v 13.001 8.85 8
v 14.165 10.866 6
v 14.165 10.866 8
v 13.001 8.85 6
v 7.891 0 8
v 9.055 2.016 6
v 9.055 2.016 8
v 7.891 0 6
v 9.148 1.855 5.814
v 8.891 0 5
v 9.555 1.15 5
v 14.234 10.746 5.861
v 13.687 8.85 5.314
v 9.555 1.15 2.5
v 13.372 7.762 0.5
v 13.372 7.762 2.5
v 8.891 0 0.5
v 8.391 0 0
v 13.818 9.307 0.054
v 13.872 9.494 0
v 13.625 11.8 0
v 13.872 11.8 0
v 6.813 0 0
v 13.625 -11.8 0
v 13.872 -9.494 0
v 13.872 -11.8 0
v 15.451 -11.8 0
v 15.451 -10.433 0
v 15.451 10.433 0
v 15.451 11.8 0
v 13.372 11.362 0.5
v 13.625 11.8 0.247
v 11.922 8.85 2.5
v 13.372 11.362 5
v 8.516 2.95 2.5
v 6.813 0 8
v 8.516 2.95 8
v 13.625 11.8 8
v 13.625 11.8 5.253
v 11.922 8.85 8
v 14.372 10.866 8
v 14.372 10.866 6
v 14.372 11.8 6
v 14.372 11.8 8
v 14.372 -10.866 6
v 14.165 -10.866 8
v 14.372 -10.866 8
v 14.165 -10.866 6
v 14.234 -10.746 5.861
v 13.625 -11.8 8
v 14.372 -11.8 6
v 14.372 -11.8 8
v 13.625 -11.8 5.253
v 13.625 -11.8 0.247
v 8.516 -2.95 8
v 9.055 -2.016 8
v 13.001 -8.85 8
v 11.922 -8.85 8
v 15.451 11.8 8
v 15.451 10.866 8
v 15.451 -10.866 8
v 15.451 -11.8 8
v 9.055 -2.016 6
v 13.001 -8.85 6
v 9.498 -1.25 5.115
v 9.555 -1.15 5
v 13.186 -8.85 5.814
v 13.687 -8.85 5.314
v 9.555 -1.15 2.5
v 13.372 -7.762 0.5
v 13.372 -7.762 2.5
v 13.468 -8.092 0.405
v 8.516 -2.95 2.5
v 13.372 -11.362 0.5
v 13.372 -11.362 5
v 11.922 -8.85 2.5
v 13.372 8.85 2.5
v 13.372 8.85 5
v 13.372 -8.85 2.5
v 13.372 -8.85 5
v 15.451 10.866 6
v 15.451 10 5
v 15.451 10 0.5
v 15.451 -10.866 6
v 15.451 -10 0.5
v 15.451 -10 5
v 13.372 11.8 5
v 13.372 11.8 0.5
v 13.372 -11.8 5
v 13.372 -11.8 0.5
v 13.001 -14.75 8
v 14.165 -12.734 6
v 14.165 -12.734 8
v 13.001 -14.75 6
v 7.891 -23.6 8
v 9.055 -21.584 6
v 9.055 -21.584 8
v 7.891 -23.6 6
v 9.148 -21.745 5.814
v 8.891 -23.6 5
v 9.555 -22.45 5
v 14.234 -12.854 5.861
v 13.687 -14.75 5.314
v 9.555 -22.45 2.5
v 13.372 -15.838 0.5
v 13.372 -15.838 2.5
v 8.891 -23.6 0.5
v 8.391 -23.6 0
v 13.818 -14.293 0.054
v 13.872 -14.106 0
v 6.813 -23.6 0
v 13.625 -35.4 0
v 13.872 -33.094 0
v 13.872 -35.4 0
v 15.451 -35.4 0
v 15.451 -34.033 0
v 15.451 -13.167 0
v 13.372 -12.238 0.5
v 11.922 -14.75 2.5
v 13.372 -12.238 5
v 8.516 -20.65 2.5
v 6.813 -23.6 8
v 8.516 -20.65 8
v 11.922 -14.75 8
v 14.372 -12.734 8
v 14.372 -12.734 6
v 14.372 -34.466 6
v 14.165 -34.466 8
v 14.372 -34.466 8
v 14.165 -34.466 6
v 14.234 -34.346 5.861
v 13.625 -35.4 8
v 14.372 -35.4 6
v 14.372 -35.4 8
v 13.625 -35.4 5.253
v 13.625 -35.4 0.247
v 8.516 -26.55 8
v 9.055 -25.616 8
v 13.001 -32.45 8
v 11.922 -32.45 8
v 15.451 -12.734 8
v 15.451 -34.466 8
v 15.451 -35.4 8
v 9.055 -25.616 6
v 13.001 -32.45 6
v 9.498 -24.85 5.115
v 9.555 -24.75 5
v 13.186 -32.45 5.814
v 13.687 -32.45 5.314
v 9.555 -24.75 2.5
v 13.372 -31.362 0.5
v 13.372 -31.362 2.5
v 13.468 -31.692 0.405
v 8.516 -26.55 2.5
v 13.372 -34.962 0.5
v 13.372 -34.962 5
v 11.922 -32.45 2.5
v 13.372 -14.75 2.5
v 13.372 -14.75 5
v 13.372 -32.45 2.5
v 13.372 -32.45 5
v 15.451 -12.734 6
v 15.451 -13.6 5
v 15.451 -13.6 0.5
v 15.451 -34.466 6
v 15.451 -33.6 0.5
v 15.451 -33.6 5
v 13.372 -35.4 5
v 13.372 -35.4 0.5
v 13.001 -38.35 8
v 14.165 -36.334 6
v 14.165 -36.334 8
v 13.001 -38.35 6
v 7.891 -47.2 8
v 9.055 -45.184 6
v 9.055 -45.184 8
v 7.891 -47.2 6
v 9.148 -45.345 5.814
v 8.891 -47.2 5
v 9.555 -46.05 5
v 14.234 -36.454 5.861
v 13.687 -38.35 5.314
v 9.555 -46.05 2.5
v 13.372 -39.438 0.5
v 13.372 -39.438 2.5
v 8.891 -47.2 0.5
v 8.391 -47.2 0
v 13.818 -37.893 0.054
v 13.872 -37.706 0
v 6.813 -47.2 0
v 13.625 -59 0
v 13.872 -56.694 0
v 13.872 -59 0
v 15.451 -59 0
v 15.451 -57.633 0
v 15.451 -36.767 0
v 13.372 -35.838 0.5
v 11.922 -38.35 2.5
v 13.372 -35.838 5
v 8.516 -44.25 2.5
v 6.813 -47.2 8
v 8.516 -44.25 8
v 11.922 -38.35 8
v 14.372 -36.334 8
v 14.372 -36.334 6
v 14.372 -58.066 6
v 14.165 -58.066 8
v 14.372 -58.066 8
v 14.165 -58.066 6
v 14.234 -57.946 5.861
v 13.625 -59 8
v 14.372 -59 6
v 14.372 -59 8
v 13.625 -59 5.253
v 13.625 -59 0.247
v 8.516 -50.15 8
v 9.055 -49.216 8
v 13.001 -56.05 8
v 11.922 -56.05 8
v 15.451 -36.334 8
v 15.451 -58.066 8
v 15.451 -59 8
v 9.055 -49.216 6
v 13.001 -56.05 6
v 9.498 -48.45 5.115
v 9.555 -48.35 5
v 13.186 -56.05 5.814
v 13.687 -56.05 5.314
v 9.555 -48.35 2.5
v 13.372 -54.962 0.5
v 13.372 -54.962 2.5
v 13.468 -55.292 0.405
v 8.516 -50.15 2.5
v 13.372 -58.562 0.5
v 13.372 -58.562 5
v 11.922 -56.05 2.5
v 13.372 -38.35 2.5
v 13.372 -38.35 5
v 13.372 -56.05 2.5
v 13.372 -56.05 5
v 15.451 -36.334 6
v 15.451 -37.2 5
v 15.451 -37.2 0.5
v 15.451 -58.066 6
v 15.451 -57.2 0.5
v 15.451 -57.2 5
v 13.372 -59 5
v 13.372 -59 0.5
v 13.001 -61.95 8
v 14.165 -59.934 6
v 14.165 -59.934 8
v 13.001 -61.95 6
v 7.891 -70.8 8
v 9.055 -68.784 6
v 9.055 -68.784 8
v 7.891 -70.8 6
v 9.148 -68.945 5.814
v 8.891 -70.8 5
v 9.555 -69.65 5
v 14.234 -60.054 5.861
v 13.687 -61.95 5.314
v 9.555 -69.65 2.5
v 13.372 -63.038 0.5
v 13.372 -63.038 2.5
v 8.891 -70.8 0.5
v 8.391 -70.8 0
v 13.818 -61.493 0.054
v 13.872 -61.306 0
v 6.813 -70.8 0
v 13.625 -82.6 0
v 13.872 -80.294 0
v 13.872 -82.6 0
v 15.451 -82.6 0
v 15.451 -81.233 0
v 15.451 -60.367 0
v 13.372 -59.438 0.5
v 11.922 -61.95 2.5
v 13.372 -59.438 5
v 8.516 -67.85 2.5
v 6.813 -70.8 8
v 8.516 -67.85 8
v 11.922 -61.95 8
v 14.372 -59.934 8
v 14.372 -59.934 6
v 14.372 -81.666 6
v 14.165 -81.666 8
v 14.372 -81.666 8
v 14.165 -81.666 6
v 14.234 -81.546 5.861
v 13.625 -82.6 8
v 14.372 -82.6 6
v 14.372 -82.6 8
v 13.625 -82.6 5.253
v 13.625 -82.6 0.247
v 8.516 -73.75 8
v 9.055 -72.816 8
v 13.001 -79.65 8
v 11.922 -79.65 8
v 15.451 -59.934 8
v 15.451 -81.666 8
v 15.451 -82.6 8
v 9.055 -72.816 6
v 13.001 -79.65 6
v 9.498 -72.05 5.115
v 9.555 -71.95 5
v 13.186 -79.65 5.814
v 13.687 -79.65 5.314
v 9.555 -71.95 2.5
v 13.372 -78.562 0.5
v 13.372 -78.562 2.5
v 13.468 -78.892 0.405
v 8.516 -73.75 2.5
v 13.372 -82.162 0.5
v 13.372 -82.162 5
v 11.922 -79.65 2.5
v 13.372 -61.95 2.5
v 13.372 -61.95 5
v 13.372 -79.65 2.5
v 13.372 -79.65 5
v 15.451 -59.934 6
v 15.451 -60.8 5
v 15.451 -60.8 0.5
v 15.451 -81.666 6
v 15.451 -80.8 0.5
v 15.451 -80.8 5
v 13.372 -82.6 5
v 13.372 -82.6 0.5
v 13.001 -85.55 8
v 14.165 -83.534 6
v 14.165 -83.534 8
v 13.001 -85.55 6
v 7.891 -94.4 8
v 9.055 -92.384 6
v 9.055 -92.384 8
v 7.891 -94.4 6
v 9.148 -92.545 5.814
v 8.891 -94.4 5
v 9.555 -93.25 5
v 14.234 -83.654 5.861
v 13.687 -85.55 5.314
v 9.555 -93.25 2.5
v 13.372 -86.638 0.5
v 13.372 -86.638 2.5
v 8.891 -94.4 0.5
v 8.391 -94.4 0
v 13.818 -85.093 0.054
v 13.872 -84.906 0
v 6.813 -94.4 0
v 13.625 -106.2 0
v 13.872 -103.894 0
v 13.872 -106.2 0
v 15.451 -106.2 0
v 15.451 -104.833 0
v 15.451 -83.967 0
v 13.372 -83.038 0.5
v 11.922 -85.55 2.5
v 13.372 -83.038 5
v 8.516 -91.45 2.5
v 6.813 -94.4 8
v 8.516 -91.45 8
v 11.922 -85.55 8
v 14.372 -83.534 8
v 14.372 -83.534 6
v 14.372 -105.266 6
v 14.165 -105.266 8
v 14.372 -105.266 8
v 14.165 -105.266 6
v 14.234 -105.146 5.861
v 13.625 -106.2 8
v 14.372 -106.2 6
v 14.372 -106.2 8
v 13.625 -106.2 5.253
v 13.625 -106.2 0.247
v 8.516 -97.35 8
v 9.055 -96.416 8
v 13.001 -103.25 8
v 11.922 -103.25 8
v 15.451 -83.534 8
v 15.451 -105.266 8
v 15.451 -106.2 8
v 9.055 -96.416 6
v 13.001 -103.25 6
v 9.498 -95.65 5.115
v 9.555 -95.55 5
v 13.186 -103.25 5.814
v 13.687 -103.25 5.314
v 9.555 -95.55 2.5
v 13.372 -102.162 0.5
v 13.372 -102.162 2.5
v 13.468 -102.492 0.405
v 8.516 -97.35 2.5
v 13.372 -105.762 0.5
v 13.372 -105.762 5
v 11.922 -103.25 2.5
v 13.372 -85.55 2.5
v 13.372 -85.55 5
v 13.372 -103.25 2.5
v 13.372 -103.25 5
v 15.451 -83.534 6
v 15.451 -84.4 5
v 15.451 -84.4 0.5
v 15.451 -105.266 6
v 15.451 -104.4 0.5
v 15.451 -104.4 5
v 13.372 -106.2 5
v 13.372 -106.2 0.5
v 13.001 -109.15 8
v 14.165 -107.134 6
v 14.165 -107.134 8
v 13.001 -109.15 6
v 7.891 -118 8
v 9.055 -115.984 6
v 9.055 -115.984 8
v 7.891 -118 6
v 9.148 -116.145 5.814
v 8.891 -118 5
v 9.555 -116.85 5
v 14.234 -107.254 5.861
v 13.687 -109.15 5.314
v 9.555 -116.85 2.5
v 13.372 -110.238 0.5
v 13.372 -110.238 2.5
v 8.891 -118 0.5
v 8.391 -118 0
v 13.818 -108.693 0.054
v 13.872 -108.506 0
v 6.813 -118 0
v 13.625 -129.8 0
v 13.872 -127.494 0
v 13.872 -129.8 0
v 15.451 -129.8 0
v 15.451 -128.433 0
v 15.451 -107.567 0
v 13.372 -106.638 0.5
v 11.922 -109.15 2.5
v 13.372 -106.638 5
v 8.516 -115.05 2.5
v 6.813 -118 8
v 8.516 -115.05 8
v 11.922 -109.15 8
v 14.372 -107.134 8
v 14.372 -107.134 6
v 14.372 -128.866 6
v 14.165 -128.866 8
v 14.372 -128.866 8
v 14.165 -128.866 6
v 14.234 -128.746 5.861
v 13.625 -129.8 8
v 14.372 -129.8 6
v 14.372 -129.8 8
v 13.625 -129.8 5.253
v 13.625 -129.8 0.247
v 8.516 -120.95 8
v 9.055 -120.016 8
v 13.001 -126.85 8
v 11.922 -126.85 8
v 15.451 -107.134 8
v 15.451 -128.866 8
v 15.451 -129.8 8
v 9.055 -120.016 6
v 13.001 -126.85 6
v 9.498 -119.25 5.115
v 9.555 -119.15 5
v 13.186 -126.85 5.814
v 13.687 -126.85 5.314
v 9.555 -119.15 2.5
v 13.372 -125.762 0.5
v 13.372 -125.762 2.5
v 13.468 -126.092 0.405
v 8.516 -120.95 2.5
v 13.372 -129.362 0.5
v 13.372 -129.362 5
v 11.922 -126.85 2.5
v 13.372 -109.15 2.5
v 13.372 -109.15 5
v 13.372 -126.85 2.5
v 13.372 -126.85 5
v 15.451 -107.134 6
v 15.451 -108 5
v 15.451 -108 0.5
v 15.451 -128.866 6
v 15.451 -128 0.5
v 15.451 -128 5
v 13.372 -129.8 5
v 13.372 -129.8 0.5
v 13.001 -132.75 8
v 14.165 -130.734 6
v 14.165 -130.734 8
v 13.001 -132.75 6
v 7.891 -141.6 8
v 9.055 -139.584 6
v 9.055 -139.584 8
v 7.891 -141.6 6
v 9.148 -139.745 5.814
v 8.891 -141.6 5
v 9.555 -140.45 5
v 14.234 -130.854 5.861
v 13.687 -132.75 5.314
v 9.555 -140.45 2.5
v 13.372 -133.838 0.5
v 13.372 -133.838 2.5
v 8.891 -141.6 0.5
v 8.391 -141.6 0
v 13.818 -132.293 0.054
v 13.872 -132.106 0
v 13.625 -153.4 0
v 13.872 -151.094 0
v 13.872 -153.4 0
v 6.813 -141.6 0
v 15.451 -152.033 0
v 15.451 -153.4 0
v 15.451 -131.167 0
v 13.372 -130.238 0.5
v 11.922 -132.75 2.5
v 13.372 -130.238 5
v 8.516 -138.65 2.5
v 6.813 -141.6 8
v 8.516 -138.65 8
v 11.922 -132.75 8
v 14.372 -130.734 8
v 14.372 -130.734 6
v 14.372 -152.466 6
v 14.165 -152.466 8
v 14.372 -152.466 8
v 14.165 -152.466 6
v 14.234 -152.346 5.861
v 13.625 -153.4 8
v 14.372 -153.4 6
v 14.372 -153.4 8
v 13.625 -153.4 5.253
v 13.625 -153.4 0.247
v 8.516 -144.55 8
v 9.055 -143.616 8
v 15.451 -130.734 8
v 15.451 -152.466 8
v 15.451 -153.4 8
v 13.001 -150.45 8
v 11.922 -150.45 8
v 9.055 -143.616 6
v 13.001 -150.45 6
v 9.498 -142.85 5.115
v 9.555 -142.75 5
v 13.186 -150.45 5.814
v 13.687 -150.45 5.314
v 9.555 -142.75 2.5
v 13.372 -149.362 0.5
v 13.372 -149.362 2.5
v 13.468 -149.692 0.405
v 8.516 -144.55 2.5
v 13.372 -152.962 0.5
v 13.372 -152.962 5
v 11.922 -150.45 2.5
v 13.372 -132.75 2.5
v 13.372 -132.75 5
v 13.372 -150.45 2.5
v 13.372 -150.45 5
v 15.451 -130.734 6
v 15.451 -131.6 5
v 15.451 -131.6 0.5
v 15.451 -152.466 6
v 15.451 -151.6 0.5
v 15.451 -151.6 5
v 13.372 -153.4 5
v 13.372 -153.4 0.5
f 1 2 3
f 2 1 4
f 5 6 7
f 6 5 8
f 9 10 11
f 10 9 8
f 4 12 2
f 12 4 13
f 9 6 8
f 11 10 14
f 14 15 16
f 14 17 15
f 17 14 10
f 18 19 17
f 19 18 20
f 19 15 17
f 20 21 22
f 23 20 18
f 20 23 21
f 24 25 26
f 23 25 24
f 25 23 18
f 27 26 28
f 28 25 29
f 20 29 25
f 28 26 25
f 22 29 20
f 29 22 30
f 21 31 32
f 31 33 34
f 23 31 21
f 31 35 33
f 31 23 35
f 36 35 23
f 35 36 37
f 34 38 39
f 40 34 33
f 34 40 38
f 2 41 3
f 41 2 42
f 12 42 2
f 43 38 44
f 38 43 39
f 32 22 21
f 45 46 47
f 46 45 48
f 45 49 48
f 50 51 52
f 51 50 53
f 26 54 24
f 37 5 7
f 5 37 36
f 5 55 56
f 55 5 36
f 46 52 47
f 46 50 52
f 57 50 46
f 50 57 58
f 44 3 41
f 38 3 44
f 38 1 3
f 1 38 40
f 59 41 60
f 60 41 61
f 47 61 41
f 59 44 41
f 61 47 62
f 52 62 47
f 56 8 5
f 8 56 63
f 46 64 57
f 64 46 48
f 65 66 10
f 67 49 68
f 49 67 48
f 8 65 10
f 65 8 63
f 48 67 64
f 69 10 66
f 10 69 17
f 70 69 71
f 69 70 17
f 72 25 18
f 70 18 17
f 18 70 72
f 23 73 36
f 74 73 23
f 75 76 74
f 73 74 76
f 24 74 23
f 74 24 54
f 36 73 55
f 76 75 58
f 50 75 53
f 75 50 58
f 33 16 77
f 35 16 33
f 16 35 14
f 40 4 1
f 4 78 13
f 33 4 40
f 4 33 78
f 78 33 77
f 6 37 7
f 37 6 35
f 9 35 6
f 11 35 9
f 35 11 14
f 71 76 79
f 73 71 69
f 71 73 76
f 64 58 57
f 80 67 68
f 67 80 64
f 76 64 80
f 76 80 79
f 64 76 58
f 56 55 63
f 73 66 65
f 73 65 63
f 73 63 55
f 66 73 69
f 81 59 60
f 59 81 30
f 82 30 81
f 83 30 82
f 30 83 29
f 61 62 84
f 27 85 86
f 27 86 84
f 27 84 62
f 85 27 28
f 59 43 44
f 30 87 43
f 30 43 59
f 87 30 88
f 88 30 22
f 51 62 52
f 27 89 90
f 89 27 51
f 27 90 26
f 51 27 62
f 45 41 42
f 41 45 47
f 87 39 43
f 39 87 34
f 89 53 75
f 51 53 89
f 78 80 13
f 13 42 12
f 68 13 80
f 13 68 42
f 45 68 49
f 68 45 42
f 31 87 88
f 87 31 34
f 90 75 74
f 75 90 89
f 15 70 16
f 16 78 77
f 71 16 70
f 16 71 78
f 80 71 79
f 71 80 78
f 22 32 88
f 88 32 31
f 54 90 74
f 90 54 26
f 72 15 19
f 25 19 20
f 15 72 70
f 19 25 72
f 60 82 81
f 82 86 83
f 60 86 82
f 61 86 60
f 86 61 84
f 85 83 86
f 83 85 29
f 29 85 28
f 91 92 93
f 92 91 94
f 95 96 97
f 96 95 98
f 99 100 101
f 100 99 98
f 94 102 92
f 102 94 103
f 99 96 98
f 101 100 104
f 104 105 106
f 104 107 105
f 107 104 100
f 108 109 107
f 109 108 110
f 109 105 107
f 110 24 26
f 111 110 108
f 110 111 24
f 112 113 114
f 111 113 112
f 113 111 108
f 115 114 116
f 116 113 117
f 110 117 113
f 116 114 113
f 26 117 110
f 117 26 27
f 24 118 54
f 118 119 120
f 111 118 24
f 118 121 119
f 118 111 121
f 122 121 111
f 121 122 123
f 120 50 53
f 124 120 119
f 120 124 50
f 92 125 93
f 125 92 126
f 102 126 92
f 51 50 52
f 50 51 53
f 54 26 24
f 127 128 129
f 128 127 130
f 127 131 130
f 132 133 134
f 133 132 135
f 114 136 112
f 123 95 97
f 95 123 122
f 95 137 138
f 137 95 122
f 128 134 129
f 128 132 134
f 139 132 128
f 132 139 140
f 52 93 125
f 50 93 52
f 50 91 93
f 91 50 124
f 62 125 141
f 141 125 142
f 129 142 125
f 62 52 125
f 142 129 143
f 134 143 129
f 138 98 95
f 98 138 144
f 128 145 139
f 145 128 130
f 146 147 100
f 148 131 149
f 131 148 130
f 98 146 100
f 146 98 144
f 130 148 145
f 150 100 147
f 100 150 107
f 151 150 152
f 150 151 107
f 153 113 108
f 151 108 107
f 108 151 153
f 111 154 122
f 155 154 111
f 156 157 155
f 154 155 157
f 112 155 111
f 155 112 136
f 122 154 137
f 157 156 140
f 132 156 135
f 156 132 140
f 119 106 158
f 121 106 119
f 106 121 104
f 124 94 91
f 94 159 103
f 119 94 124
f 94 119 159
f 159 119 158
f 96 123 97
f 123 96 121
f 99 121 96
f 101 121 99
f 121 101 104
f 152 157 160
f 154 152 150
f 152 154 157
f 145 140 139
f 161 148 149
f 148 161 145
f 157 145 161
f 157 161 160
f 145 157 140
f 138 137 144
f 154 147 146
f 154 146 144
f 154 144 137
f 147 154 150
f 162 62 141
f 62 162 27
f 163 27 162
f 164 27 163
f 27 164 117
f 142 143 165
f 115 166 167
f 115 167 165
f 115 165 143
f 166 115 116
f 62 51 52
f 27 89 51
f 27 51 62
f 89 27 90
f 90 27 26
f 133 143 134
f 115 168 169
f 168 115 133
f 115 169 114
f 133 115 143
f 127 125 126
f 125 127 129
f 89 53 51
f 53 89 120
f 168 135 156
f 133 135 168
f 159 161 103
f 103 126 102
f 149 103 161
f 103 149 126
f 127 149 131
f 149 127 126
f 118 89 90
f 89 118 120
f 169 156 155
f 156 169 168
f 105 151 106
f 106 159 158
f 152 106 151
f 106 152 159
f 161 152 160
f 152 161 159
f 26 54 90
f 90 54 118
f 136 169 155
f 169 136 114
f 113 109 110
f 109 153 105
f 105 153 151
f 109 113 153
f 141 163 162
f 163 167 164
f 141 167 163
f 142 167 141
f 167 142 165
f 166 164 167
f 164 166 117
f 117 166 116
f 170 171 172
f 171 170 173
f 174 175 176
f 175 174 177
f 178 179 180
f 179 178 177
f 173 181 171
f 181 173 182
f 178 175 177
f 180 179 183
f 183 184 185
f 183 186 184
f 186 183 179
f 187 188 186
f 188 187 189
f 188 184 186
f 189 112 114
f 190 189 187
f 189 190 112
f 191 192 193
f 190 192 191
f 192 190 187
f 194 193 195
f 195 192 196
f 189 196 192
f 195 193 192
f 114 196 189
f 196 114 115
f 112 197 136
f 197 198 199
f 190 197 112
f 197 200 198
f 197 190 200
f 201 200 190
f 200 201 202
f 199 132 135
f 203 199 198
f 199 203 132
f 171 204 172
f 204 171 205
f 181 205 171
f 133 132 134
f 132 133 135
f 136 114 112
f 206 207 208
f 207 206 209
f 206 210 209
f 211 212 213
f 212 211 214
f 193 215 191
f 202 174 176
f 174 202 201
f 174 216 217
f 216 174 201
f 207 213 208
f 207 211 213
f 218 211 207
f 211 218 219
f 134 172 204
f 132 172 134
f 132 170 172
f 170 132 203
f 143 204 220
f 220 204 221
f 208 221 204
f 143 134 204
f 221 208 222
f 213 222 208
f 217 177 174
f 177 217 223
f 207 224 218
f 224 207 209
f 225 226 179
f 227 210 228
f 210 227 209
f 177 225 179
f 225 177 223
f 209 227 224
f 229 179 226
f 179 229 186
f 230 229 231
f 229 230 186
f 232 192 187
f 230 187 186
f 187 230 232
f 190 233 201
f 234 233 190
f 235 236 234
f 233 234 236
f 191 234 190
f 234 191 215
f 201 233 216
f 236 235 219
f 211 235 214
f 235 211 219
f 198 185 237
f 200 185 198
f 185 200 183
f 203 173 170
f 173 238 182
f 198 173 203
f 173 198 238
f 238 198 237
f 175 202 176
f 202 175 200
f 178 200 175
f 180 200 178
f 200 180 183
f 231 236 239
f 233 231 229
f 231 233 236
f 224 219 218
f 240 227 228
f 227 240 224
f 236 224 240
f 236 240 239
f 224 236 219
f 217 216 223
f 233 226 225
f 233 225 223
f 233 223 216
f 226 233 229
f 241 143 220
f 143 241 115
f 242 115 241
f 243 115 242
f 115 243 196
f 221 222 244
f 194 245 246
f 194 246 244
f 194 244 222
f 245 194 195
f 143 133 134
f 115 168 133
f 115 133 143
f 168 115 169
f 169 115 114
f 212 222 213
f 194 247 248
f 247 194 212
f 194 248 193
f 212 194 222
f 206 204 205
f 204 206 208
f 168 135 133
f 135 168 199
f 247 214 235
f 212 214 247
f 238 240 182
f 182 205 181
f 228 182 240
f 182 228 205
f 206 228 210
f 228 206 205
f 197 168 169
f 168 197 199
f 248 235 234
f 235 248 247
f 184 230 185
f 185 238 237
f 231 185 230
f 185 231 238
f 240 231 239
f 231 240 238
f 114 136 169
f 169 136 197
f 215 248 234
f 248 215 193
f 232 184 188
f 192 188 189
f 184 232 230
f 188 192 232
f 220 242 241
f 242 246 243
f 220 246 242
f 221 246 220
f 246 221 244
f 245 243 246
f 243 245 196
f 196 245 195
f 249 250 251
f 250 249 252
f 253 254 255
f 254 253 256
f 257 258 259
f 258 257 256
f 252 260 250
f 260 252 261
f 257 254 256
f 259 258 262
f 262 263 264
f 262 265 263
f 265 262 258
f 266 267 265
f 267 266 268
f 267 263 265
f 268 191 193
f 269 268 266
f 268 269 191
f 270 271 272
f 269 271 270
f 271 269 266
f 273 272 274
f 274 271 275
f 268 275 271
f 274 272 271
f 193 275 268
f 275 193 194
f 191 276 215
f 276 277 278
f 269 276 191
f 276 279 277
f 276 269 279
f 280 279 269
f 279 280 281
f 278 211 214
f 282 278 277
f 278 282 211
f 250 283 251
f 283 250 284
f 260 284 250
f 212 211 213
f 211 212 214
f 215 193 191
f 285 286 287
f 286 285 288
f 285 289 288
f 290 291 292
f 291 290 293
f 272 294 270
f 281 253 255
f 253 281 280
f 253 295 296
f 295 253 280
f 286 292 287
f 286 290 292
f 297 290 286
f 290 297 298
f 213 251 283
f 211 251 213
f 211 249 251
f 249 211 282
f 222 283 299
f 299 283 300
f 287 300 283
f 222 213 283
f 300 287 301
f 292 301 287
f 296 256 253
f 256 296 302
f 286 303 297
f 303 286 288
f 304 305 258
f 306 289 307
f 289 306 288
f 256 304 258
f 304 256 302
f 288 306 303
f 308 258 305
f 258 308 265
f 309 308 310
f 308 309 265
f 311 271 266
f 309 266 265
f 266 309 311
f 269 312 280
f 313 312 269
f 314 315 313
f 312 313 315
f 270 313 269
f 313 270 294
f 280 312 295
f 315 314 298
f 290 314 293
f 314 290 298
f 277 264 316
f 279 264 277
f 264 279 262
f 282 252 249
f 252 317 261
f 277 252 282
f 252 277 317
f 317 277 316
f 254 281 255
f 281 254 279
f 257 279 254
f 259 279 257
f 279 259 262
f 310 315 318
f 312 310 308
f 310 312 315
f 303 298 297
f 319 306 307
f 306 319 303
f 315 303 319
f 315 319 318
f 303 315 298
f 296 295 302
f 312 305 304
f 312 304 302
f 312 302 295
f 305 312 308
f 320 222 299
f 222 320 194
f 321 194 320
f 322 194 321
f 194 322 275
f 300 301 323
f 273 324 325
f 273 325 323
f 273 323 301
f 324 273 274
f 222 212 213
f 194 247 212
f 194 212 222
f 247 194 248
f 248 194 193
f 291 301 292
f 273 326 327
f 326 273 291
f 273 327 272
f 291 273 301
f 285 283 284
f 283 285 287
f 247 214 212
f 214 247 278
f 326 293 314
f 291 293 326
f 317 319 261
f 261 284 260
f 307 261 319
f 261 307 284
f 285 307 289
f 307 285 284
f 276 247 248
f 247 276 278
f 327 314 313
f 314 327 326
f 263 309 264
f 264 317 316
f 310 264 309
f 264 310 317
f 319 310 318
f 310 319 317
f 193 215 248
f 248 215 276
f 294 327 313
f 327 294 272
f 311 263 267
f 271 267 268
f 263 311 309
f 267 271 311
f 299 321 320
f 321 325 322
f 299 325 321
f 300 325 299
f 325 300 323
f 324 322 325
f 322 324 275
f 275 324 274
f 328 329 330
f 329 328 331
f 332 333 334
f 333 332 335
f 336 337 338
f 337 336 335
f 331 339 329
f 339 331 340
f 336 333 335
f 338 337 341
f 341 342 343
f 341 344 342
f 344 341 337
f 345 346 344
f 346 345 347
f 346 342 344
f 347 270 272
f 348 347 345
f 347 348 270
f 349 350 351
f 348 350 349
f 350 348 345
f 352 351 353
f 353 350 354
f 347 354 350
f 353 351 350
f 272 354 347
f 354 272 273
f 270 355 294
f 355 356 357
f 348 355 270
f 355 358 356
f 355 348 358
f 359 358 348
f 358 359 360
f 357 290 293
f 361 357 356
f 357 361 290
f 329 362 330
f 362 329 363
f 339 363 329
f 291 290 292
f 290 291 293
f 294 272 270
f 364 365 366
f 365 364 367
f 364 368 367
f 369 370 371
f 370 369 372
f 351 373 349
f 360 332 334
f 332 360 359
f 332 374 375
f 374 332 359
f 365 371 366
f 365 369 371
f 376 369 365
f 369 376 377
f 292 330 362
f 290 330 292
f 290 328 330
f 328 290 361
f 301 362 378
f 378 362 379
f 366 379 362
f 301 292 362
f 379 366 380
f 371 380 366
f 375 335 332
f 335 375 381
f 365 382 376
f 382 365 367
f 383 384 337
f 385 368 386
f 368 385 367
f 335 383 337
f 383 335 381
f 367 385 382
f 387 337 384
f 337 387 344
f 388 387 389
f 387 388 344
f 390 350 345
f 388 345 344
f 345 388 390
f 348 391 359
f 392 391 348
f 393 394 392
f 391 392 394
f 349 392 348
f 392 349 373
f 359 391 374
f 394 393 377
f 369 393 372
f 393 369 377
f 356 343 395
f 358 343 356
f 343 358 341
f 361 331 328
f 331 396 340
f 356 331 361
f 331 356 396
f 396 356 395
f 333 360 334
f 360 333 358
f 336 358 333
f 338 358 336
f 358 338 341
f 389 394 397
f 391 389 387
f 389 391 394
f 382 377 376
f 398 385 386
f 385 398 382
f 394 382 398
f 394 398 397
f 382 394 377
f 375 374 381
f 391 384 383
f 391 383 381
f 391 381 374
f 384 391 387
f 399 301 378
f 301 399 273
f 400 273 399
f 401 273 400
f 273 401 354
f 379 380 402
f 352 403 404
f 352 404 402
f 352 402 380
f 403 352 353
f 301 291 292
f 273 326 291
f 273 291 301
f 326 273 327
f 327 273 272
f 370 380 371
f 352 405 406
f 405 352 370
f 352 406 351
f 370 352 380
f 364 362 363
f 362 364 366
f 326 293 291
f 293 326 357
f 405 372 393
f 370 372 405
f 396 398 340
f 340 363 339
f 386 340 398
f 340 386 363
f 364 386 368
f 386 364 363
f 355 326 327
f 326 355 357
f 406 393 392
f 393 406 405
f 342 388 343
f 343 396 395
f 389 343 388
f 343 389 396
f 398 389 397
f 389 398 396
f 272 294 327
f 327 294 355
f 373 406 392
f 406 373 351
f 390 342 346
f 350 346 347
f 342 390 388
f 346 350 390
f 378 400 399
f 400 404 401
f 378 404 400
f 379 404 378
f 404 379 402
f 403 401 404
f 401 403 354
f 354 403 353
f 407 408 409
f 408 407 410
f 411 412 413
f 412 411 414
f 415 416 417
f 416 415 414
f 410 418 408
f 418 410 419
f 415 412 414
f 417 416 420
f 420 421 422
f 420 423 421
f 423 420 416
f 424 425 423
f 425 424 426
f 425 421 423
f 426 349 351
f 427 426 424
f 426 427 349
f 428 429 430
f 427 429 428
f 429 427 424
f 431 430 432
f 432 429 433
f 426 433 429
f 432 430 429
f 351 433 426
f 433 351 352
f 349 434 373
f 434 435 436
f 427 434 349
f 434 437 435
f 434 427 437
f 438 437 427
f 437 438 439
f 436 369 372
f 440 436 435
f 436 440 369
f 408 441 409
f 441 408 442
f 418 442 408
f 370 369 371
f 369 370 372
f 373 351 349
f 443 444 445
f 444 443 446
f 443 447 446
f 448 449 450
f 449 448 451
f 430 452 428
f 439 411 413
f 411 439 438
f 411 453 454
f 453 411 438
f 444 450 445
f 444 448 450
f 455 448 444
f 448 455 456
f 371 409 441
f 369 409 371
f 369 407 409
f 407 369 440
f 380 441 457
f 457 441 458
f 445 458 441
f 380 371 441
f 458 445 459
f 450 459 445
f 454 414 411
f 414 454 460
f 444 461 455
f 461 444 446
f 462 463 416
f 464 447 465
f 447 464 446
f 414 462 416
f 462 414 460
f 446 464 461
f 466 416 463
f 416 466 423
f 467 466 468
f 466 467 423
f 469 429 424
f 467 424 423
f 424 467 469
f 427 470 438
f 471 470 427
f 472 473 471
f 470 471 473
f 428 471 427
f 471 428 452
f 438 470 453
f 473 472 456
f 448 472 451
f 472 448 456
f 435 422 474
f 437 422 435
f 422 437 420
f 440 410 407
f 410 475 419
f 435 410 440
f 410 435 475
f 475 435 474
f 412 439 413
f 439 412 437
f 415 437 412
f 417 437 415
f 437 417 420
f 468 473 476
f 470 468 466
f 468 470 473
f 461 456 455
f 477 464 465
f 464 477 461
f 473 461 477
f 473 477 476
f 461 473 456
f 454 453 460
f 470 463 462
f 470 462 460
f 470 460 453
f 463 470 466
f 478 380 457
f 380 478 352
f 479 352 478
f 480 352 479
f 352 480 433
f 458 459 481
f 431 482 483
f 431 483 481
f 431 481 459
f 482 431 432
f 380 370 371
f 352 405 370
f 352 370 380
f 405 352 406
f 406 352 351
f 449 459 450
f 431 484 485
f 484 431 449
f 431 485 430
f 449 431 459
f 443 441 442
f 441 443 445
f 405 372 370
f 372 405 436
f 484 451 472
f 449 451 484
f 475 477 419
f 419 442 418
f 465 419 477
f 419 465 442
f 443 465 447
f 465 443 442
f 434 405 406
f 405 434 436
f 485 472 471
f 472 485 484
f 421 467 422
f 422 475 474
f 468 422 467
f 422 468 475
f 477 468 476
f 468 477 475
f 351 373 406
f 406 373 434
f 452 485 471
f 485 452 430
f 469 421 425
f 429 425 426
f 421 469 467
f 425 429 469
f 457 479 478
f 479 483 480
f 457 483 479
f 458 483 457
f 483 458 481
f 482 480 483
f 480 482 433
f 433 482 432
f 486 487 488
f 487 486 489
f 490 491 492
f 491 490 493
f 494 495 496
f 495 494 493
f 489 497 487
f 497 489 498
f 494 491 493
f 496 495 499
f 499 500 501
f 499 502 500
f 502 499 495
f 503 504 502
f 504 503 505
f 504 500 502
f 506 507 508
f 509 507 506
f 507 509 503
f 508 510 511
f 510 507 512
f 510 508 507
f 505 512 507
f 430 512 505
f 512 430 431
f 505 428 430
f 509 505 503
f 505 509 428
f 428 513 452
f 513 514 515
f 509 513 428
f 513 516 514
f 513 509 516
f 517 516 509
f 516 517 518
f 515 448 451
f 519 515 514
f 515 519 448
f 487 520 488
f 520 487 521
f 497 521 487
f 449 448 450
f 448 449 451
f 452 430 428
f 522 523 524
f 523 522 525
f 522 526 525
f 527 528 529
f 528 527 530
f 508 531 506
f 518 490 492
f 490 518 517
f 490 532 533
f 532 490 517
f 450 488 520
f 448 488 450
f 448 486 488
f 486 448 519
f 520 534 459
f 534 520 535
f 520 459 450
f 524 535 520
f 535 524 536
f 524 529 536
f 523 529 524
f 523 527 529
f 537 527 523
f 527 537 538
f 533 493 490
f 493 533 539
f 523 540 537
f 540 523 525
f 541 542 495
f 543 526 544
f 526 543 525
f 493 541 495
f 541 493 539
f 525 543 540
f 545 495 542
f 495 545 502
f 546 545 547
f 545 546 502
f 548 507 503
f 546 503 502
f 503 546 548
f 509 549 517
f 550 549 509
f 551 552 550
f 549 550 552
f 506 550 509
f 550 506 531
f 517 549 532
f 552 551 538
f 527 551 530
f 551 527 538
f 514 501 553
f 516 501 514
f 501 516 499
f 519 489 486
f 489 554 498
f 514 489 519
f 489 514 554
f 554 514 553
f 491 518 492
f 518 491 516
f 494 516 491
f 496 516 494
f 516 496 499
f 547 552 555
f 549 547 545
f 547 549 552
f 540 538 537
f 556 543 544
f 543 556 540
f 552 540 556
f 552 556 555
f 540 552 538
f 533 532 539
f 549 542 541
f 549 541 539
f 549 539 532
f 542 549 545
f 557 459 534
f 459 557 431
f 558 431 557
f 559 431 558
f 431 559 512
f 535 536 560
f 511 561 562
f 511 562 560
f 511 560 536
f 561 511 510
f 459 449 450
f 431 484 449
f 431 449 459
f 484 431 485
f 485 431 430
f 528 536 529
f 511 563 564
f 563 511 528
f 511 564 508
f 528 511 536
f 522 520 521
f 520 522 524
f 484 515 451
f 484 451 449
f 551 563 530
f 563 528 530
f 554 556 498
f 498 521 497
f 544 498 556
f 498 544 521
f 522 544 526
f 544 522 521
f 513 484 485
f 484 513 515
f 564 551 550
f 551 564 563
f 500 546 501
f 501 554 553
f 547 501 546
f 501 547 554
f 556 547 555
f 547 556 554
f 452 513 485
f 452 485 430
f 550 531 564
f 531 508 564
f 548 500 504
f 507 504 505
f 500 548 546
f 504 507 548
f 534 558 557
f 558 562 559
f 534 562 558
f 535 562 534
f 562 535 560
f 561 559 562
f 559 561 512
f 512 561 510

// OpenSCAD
$fn = 50;

radius = 13.6;
diameter =  radius * 2;

h_inner = 10;
r_inner = h_inner * 2/sqrt(3);

h_outer = 10+1.8;
r_outer = h_outer * 2/sqrt(3);


h_thin = 10+1;
r_thin = h_thin * 2/sqrt(3);

total_height = 8;

small_value = 0.1;


clips_height = 5;
clips_offset = 0.5;
clips_side_offset = 0.00;


module basic_polygon() {
  polygon([[r_outer, total_height], [r_outer, 0], [r_inner+0.5, 0], [r_inner, 0.5], 
        [r_inner, total_height-3], [r_inner+1, total_height-2], [r_inner+1,total_height]]);    
}

module basic_model() {
  rotate_extrude($fn=6) {
      basic_polygon();
  }
}


module panel_with_clips(pin_1=false, pin_2=false, pin_3=false, pin_4=false, pin_5=false, pin_6=false, slot_1=false, slot_2=false, slot_3=false, slot_4=false, slot_5=false, slot_6=false) {

  difference() {
    basic_model();

    if (slot_1) {
      rotate([0, 0, 0])
        translate([0, -h_outer*2, total_height - (clips_height+clips_offset)/2])
          linear_extrude(height=clips_height+clips_offset, center=true)
            polygon([[clips_side_offset, h_outer/2], [-clips_side_offset, h_outer/2], [-r_outer/2-clips_side_offset, h_outer*1.5], [r_outer/2+clips_side_offset, h_outer*1.5]]);
    }

    if (slot_2) {
      rotate([0, 0, 60])
        translate([0, -h_outer*2, total_height - (clips_height+clips_offset)/2])
          linear_extrude(height=clips_height+clips_offset, center=true)
            polygon([[clips_side_offset, h_outer/2], [-clips_side_offset, h_outer/2], [-r_outer/2-clips_side_offset, h_outer*1.5], [r_outer/2+clips_side_offset, h_outer*1.5]]);
    }



    if (slot_3) {
      rotate([0, 0, 120])
        translate([0, -h_outer*2, total_height - (clips_height+clips_offset)/2])
          linear_extrude(height=clips_height+clips_offset, center=true)
            polygon([[clips_side_offset, h_outer/2], [-clips_side_offset, h_outer/2], [-r_outer/2-clips_side_offset, h_outer*1.5], [r_outer/2+clips_side_offset, h_outer*1.5]]);
    }

    if (slot_4) {
      rotate([0, 0, 180])
        translate([0, -h_outer*2, total_height - (clips_height+clips_offset)/2])
          linear_extrude(height=clips_height+clips_offset, center=true)
            polygon([[clips_side_offset, h_outer/2], [-clips_side_offset, h_outer/2], [-r_outer/2-clips_side_offset, h_outer*1.5], [r_outer/2+clips_side_offset, h_outer*1.5]]);
    }

    if (slot_5) {
      rotate([0, 0, 240])
        translate([0, -h_outer*2, total_height - (clips_height+clips_offset)/2])
          linear_extrude(height=clips_height+clips_offset, center=true)
            polygon([[clips_side_offset, h_outer/2], [-clips_side_offset, h_outer/2], [-r_outer/2-clips_side_offset, h_outer*1.5], [r_outer/2+clips_side_offset, h_outer*1.5]]);
    }

    if (slot_6) {
      rotate([0, 0, 300])
        translate([0, -h_outer*2, total_height - (clips_height+clips_offset)/2])
          linear_extrude(height=clips_height+clips_offset, center=true)
            polygon([[clips_side_offset, h_outer/2], [-clips_side_offset, h_outer/2], [-r_outer/2-clips_side_offset, h_outer*1.5], [r_outer/2+clips_side_offset, h_outer*1.5]]);
    }
  }


  if (pin_1) {
    intersection() {
      translate([0,-h_outer*2, 0])
        basic_model();
      translate([0, 0, total_height - clips_height/2]) {
        rotate([0, 0, -180])  
          linear_extrude(height=clips_height, center=true)
            polygon([[0, h_outer/2], [-r_outer/2, h_outer*1.5], [r_outer/2, h_outer*1.5]]);  
      }
    }
  }

  if (pin_2) {
    intersection() {
      translate([r_outer*1.5,-h_outer, 0])
        basic_model();
      translate([0, 0, total_height - clips_height/2]) {
        rotate([0, 0, -120])  
          linear_extrude(height=clips_height, center=true)
            polygon([[0, h_outer/2], [-r_outer/2, h_outer*1.5], [r_outer/2, h_outer*1.5]]);  
      }
    }
  }


  if (pin_3) {
    intersection() {
      translate([r_outer*1.5,h_outer, 0])
        basic_model();
      translate([0, 0, total_height - clips_height/2]) {
        rotate([0, 0, -60])  
          linear_extrude(height=clips_height, center=true)
            polygon([[0, h_outer/2], [-r_outer/2, h_outer*1.5], [r_outer/2, h_outer*1.5]]);  
      }
    }
  }

  if (pin_4) {
    intersection() {
      translate([0, h_outer*2, 0])
        basic_model();

      translate([0, 0, total_height - clips_height/2]) {
        linear_extrude(height=clips_height, center=true)
          polygon([[0, h_outer/2], [-r_outer/2, h_outer*1.5], [r_outer/2, h_outer*1.5]]);
      }  
    }
  }

  if (pin_5) {
    intersection() {
      translate([-r_outer*1.5,h_outer, 0])
        basic_model();
      translate([0, 0, total_height - clips_height/2]) {
        rotate([0, 0, 60])  
          linear_extrude(height=clips_height, center=true)
            polygon([[0, h_outer/2], [-r_outer/2, h_outer*1.5], [r_outer/2, h_outer*1.5]]);  
      }
    }
  }
  
  if (pin_6) {
    intersection() {
      translate([-r_outer*1.5, -h_outer, 0])
        basic_model();

      translate([0, 0, total_height - clips_height/2]) {
        rotate([0, 0, 120])  
          linear_extrude(height=clips_height, center=true)
            polygon([[0, h_outer/2], [-r_outer/2, h_outer*1.5], [r_outer/2, h_outer*1.5]]);  
      }
    }
  }
}

// end honeycomb_element.scad




module perimeter_right_item(slot_5=true, slot_6=true) {
  difference() {
      translate([r_outer * 1.5, 0, 0])
        panel_with_clips(slot_6=slot_6, slot_5=slot_5);
      translate([50+r_outer * 1.5-r_outer/2 + (r_outer-h_outer), 0, 0])
        cube([100, 100, 100], center = true);
  }
  translate([0 + r_outer-h_outer, 0, 0])
    rotate([90, 0, 0])
      linear_extrude(height = h_outer * 2, center=true)
        basic_polygon();
}



module perimeter_right() {  
    
    for (i = [0:6]) {    
      translate([0, -h_outer*2*i, 0])
        perimeter_right_item();   
    }
}



perimeter_right();
